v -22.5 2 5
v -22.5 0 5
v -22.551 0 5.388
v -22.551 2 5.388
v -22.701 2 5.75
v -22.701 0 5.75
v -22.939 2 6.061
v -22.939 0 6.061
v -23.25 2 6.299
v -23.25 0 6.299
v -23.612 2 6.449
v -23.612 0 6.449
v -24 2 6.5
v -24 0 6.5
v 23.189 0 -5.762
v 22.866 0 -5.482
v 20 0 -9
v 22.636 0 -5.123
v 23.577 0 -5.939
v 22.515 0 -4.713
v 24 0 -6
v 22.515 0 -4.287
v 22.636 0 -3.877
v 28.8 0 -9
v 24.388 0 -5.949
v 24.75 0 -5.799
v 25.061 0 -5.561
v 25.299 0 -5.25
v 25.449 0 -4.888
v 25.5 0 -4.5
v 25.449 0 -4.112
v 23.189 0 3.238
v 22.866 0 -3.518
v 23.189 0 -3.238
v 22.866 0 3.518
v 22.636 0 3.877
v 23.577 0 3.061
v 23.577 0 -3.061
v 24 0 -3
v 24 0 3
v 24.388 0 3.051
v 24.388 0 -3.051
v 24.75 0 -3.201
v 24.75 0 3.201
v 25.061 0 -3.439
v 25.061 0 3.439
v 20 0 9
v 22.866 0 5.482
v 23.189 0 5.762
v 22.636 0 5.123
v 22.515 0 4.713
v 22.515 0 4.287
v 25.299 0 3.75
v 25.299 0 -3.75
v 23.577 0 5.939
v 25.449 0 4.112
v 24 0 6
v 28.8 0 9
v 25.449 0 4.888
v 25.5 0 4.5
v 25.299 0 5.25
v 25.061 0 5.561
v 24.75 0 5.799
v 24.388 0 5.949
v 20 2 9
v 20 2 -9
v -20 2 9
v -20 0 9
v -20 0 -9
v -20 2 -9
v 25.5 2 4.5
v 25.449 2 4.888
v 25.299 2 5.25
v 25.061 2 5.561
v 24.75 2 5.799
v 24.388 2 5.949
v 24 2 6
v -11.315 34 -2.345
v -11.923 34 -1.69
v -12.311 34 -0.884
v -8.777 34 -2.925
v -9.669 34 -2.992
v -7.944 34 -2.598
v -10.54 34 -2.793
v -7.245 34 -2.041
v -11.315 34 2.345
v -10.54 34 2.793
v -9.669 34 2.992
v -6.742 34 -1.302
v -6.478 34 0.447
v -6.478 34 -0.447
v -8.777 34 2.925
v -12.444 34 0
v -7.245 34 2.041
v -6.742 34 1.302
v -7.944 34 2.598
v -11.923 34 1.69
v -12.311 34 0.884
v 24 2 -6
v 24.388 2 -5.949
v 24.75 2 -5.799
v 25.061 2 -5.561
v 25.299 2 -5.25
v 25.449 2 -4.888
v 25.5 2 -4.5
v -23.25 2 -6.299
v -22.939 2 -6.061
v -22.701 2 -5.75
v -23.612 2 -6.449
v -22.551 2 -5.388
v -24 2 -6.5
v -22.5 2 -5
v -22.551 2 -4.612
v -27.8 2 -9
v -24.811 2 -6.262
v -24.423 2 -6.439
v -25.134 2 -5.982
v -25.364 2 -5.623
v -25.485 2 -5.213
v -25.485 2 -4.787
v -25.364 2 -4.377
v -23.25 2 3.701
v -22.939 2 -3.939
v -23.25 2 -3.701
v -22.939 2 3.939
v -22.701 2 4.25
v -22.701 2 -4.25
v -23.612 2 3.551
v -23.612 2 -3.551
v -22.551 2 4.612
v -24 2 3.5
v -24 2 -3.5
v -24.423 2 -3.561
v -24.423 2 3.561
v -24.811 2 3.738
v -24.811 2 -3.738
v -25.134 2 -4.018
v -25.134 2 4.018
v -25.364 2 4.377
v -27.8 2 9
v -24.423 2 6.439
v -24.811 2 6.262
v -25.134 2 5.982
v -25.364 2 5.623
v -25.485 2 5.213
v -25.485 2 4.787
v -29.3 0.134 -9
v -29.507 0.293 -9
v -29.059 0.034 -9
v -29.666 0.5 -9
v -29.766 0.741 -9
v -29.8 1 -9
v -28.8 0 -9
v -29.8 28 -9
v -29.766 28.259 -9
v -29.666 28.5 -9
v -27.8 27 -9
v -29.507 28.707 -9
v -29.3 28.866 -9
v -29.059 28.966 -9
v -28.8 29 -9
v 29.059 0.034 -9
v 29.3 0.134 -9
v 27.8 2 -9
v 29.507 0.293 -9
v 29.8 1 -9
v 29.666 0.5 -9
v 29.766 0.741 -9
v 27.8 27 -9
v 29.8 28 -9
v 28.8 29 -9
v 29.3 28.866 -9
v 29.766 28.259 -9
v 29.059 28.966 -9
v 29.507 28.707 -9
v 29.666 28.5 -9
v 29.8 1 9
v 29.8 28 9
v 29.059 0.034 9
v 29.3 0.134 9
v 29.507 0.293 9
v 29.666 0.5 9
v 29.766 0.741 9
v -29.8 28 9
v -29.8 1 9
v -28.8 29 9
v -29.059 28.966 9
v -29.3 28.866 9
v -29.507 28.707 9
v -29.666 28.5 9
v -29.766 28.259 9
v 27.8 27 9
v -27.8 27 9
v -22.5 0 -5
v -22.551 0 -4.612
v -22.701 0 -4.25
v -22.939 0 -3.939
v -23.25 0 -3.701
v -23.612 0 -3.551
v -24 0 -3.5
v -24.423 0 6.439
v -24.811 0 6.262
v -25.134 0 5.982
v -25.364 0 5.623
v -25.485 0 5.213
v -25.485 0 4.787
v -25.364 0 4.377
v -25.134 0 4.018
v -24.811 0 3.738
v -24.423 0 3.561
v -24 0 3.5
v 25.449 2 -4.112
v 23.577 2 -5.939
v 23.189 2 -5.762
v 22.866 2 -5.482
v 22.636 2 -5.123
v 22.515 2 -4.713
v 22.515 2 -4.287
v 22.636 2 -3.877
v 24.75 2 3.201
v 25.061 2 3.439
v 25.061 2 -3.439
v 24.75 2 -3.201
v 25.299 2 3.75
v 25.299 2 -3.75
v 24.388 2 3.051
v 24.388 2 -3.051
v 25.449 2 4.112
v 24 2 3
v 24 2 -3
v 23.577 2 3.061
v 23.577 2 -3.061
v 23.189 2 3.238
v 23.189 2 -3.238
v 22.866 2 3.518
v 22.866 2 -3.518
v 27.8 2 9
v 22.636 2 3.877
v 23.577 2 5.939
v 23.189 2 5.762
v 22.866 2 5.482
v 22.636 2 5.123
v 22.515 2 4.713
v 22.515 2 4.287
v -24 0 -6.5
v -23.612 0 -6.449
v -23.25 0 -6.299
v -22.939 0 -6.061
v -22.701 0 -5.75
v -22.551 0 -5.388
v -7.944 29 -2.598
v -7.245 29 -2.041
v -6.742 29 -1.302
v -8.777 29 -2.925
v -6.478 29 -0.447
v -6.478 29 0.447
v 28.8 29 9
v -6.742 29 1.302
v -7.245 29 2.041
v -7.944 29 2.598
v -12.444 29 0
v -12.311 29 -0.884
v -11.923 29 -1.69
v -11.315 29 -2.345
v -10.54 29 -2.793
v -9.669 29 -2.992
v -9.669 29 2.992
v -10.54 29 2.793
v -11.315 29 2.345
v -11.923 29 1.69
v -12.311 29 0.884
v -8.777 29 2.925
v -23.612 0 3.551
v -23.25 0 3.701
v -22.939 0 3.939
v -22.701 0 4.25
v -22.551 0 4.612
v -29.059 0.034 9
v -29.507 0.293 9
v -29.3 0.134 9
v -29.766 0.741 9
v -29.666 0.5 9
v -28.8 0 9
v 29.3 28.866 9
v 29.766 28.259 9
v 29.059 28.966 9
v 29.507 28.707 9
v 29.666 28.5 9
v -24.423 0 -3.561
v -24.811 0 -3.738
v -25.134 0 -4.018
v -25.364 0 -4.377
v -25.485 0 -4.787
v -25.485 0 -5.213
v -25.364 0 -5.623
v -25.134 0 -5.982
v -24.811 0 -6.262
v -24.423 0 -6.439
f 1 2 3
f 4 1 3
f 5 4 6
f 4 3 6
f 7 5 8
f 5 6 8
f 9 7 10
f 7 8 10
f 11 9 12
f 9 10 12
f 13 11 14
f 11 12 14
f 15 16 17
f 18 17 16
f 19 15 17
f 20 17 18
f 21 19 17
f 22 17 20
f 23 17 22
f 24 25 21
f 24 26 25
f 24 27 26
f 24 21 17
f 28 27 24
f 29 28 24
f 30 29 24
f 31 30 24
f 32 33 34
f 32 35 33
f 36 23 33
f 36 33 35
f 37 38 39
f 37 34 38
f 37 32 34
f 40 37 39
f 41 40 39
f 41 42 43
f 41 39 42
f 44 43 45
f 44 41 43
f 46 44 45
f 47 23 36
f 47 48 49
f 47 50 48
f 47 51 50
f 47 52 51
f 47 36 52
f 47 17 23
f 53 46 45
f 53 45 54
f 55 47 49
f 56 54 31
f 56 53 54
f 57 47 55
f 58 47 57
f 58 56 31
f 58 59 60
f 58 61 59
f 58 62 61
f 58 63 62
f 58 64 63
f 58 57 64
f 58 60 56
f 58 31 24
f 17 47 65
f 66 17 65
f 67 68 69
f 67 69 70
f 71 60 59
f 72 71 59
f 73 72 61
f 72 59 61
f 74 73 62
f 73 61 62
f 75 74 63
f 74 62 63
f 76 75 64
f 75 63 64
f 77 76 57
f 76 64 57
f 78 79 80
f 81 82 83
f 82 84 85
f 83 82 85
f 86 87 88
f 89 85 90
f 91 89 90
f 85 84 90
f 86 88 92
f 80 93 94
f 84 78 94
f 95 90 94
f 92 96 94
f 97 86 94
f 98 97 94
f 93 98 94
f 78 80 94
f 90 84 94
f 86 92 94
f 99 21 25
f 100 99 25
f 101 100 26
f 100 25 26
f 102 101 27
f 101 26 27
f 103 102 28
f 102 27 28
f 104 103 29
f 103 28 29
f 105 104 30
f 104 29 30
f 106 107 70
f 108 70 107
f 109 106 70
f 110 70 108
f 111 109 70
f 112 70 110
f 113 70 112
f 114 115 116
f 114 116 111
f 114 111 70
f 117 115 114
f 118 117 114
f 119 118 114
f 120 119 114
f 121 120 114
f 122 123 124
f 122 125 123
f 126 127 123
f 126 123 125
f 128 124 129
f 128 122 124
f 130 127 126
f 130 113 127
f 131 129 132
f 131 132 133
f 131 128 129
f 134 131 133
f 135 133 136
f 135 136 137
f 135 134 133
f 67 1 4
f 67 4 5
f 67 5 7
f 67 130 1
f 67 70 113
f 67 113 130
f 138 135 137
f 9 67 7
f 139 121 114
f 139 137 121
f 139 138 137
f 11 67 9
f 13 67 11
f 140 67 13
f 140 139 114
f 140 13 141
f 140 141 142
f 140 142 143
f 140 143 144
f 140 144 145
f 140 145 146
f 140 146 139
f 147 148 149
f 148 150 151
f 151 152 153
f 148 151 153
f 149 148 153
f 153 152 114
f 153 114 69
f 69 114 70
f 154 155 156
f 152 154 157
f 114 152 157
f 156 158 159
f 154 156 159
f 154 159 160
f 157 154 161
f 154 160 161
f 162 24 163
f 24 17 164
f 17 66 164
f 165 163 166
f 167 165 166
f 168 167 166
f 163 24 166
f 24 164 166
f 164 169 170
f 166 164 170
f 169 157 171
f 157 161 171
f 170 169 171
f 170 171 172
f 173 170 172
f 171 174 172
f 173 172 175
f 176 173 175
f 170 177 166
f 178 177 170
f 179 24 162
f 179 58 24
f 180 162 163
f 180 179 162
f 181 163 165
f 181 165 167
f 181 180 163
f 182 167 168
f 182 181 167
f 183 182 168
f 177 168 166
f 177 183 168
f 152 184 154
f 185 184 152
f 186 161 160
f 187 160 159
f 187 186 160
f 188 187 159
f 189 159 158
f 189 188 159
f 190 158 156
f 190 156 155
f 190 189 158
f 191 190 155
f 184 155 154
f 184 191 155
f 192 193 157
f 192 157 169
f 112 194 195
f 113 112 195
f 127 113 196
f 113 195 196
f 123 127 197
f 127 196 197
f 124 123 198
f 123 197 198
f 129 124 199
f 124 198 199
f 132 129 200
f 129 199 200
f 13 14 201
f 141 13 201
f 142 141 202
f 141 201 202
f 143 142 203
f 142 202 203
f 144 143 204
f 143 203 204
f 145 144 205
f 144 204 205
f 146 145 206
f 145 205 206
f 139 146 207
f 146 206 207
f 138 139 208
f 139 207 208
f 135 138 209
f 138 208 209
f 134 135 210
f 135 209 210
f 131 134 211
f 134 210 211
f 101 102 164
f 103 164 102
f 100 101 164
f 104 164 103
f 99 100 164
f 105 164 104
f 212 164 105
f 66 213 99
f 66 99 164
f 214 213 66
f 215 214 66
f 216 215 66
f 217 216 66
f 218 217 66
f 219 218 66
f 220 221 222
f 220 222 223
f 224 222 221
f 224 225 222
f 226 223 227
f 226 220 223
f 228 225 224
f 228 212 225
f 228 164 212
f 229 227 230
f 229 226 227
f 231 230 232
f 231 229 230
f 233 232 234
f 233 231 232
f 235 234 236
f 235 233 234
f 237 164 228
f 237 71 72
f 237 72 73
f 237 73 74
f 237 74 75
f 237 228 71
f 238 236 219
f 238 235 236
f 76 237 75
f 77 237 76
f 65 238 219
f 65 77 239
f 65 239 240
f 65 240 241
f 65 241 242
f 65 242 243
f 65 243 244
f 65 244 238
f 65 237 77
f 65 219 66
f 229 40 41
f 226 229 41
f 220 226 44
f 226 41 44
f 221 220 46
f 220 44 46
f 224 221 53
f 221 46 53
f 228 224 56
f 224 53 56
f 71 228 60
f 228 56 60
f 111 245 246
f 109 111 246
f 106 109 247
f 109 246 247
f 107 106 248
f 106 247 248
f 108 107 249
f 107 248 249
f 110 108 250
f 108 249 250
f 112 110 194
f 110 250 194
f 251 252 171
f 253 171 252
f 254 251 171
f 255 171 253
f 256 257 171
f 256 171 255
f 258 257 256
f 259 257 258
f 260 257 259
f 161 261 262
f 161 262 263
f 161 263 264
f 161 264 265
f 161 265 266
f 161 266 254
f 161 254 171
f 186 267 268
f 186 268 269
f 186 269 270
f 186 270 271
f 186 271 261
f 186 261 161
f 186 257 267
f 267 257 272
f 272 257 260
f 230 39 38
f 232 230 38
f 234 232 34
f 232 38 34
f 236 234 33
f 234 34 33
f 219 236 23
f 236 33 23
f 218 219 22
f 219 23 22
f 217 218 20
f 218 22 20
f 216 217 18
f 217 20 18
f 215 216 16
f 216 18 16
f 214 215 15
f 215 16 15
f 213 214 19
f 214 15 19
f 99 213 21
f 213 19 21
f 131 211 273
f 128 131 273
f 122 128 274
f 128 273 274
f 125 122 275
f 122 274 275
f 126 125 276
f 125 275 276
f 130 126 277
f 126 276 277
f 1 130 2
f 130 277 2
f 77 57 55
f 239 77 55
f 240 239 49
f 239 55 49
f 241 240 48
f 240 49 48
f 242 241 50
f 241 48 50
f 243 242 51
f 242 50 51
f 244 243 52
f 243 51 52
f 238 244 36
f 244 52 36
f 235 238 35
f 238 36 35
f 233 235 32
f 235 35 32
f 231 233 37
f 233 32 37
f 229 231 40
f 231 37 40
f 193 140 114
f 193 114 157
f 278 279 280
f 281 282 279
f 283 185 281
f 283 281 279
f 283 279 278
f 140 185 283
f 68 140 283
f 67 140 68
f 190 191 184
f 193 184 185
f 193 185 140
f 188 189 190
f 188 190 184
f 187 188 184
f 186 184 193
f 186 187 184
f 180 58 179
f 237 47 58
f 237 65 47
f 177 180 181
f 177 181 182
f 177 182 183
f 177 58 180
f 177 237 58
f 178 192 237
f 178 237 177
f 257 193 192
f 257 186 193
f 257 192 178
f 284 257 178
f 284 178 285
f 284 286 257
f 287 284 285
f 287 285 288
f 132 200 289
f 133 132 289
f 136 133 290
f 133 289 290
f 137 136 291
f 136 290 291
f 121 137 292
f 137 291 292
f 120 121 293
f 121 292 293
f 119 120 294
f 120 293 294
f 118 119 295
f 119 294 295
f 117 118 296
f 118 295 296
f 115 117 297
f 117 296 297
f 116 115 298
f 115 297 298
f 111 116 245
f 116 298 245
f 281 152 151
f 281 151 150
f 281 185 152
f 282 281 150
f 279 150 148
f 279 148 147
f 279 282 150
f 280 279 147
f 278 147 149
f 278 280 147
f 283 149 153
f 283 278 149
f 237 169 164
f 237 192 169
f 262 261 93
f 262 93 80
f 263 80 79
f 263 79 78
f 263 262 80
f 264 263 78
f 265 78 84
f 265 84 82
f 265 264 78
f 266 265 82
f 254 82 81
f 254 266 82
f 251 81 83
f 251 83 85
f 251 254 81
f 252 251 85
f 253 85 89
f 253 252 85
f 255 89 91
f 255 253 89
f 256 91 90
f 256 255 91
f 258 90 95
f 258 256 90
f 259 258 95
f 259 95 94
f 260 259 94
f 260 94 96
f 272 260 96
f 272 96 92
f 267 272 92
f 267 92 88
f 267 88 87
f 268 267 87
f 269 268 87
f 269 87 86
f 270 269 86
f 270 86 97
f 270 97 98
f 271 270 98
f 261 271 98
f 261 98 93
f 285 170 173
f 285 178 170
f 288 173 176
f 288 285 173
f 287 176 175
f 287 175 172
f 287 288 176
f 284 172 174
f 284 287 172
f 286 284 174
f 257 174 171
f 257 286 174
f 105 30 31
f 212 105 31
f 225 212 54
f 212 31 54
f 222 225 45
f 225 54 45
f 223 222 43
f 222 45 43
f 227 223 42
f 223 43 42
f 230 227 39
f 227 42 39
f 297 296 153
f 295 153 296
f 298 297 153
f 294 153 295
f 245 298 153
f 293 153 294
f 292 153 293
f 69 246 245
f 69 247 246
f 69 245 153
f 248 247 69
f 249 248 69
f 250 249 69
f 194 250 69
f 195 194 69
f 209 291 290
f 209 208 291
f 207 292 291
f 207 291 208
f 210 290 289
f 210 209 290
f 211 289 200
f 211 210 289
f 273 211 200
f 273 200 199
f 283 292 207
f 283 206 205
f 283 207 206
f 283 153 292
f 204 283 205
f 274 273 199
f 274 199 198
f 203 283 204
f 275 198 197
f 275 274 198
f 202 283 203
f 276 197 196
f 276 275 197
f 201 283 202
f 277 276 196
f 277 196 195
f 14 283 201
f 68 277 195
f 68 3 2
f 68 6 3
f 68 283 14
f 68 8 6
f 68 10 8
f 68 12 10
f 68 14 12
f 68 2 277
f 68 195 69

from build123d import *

# Parameters (mm, degrees)
F1_W     = 5.8
F1_H     = 2
F1_W_2   = 2
F2_DEPTH = 9
F3_DEPTH = 25
F4_R     = 1
F6_DEPTH = 7


with BuildPart() as f2:
    # F1 (on Top) → F2 (new body, symmetric)
    with BuildSketch(Plane.XY):
        with Locations((22.9, 1)):
            Rectangle(F1_W, F1_H)
        with Locations((26.8, 1)):
            Rectangle(F1_W_2, F1_H)
        Polygon((-29.8, 0), (-27.8, 0), (-27.8, 2), (-27.8, 27), (-27.8, 29), (-29.8, 29), align=None)
        Polygon((27.8, 29), (27.8, 27), (27.8, 2), (27.8, 0), (29.8, 0), (29.8, 29), align=None)
        Polygon((-27.8, 27), (-25.8, 27), (25.8, 27), (27.8, 27), (27.8, 29), (-27.8, 29), align=None)
        with Locations((-26.8, 1)):
            Rectangle(F1_W_2, F1_H)
        with Locations((-22.9, 1)):
            Rectangle(F1_W, F1_H)
    extrude(amount=F2_DEPTH, both=True)

    # F0 (on Front) → F3 (cut)
    with BuildSketch(Plane.XZ):
        with BuildLine():
            ThreePointArc((-24, 6.5), (-25.5, 5), (-24, 3.5))
            Line((-24, 3.5), (-24, 6.5))
        make_face()
        with BuildLine():
            Line((-24, 6.5), (-24, 3.5))
            ThreePointArc((-24, 3.5), (-22.9393398282, 3.9393398282), (-22.5, 5))
            ThreePointArc((-22.5, 5), (-22.9393398282, 6.0606601718), (-24, 6.5))
        make_face()
        with BuildLine():
            Line((-24, -6.5), (-24, -3.5))
            ThreePointArc((-24, -3.5), (-25.5, -5), (-24, -6.5))
        make_face()
        with BuildLine():
            ThreePointArc((-22.5, -5), (-22.9393398282, -3.9393398282), (-24, -3.5))
            Line((-24, -3.5), (-24, -6.5))
            ThreePointArc((-24, -6.5), (-22.9393398282, -6.0606601718), (-22.5, -5))
        make_face()
        with BuildLine():
            Line((24, 3), (24, 6))
            ThreePointArc((24, 6), (22.5, 4.5), (24, 3))
        make_face()
        with BuildLine():
            ThreePointArc((25.5, 4.5), (25.0606601718, 5.5606601718), (24, 6))
            Line((24, 6), (24, 3))
            ThreePointArc((24, 3), (25.0606601718, 3.4393398282), (25.5, 4.5))
        make_face()
        with BuildLine():
            Line((24, -3), (24, -6))
            ThreePointArc((24, -6), (25.0606601718, -5.5606601718), (25.5, -4.5))
            ThreePointArc((25.5, -4.5), (25.0606601718, -3.4393398282), (24, -3))
        make_face()
        with BuildLine():
            ThreePointArc((24, -3), (22.5, -4.5), (24, -6))
            Line((24, -6), (24, -3))
        make_face()
    extrude(amount=-F3_DEPTH, mode=Mode.SUBTRACT)

    # F4
    f4_edges = [f2.edges().sort_by_distance(p)[0] for p in [
        (-29.8, 0, 0),
        (29.8, 0, 0),
        (29.8, 29, 0),
        (-29.8, 29, 0),
    ]]
    fillet(f4_edges, radius=F4_R)

    # F5 (on face) → F6 (join)
    with BuildSketch(Plane.XZ.offset(-27)):
        with BuildLine():
            ThreePointArc((-6.4444444444, 0), (-9.4444444444, 3), (-12.4444444444, 0))
            Line((-12.4444444444, 0), (-6.4444444444, 0))
        make_face()
        with BuildLine():
            Line((-6.4444444444, 0), (-12.4444444444, 0))
            ThreePointArc((-12.4444444444, 0), (-9.4444444444, -3), (-6.4444444444, 0))
        make_face()
    extrude(amount=-F6_DEPTH)


solid = f2.part
